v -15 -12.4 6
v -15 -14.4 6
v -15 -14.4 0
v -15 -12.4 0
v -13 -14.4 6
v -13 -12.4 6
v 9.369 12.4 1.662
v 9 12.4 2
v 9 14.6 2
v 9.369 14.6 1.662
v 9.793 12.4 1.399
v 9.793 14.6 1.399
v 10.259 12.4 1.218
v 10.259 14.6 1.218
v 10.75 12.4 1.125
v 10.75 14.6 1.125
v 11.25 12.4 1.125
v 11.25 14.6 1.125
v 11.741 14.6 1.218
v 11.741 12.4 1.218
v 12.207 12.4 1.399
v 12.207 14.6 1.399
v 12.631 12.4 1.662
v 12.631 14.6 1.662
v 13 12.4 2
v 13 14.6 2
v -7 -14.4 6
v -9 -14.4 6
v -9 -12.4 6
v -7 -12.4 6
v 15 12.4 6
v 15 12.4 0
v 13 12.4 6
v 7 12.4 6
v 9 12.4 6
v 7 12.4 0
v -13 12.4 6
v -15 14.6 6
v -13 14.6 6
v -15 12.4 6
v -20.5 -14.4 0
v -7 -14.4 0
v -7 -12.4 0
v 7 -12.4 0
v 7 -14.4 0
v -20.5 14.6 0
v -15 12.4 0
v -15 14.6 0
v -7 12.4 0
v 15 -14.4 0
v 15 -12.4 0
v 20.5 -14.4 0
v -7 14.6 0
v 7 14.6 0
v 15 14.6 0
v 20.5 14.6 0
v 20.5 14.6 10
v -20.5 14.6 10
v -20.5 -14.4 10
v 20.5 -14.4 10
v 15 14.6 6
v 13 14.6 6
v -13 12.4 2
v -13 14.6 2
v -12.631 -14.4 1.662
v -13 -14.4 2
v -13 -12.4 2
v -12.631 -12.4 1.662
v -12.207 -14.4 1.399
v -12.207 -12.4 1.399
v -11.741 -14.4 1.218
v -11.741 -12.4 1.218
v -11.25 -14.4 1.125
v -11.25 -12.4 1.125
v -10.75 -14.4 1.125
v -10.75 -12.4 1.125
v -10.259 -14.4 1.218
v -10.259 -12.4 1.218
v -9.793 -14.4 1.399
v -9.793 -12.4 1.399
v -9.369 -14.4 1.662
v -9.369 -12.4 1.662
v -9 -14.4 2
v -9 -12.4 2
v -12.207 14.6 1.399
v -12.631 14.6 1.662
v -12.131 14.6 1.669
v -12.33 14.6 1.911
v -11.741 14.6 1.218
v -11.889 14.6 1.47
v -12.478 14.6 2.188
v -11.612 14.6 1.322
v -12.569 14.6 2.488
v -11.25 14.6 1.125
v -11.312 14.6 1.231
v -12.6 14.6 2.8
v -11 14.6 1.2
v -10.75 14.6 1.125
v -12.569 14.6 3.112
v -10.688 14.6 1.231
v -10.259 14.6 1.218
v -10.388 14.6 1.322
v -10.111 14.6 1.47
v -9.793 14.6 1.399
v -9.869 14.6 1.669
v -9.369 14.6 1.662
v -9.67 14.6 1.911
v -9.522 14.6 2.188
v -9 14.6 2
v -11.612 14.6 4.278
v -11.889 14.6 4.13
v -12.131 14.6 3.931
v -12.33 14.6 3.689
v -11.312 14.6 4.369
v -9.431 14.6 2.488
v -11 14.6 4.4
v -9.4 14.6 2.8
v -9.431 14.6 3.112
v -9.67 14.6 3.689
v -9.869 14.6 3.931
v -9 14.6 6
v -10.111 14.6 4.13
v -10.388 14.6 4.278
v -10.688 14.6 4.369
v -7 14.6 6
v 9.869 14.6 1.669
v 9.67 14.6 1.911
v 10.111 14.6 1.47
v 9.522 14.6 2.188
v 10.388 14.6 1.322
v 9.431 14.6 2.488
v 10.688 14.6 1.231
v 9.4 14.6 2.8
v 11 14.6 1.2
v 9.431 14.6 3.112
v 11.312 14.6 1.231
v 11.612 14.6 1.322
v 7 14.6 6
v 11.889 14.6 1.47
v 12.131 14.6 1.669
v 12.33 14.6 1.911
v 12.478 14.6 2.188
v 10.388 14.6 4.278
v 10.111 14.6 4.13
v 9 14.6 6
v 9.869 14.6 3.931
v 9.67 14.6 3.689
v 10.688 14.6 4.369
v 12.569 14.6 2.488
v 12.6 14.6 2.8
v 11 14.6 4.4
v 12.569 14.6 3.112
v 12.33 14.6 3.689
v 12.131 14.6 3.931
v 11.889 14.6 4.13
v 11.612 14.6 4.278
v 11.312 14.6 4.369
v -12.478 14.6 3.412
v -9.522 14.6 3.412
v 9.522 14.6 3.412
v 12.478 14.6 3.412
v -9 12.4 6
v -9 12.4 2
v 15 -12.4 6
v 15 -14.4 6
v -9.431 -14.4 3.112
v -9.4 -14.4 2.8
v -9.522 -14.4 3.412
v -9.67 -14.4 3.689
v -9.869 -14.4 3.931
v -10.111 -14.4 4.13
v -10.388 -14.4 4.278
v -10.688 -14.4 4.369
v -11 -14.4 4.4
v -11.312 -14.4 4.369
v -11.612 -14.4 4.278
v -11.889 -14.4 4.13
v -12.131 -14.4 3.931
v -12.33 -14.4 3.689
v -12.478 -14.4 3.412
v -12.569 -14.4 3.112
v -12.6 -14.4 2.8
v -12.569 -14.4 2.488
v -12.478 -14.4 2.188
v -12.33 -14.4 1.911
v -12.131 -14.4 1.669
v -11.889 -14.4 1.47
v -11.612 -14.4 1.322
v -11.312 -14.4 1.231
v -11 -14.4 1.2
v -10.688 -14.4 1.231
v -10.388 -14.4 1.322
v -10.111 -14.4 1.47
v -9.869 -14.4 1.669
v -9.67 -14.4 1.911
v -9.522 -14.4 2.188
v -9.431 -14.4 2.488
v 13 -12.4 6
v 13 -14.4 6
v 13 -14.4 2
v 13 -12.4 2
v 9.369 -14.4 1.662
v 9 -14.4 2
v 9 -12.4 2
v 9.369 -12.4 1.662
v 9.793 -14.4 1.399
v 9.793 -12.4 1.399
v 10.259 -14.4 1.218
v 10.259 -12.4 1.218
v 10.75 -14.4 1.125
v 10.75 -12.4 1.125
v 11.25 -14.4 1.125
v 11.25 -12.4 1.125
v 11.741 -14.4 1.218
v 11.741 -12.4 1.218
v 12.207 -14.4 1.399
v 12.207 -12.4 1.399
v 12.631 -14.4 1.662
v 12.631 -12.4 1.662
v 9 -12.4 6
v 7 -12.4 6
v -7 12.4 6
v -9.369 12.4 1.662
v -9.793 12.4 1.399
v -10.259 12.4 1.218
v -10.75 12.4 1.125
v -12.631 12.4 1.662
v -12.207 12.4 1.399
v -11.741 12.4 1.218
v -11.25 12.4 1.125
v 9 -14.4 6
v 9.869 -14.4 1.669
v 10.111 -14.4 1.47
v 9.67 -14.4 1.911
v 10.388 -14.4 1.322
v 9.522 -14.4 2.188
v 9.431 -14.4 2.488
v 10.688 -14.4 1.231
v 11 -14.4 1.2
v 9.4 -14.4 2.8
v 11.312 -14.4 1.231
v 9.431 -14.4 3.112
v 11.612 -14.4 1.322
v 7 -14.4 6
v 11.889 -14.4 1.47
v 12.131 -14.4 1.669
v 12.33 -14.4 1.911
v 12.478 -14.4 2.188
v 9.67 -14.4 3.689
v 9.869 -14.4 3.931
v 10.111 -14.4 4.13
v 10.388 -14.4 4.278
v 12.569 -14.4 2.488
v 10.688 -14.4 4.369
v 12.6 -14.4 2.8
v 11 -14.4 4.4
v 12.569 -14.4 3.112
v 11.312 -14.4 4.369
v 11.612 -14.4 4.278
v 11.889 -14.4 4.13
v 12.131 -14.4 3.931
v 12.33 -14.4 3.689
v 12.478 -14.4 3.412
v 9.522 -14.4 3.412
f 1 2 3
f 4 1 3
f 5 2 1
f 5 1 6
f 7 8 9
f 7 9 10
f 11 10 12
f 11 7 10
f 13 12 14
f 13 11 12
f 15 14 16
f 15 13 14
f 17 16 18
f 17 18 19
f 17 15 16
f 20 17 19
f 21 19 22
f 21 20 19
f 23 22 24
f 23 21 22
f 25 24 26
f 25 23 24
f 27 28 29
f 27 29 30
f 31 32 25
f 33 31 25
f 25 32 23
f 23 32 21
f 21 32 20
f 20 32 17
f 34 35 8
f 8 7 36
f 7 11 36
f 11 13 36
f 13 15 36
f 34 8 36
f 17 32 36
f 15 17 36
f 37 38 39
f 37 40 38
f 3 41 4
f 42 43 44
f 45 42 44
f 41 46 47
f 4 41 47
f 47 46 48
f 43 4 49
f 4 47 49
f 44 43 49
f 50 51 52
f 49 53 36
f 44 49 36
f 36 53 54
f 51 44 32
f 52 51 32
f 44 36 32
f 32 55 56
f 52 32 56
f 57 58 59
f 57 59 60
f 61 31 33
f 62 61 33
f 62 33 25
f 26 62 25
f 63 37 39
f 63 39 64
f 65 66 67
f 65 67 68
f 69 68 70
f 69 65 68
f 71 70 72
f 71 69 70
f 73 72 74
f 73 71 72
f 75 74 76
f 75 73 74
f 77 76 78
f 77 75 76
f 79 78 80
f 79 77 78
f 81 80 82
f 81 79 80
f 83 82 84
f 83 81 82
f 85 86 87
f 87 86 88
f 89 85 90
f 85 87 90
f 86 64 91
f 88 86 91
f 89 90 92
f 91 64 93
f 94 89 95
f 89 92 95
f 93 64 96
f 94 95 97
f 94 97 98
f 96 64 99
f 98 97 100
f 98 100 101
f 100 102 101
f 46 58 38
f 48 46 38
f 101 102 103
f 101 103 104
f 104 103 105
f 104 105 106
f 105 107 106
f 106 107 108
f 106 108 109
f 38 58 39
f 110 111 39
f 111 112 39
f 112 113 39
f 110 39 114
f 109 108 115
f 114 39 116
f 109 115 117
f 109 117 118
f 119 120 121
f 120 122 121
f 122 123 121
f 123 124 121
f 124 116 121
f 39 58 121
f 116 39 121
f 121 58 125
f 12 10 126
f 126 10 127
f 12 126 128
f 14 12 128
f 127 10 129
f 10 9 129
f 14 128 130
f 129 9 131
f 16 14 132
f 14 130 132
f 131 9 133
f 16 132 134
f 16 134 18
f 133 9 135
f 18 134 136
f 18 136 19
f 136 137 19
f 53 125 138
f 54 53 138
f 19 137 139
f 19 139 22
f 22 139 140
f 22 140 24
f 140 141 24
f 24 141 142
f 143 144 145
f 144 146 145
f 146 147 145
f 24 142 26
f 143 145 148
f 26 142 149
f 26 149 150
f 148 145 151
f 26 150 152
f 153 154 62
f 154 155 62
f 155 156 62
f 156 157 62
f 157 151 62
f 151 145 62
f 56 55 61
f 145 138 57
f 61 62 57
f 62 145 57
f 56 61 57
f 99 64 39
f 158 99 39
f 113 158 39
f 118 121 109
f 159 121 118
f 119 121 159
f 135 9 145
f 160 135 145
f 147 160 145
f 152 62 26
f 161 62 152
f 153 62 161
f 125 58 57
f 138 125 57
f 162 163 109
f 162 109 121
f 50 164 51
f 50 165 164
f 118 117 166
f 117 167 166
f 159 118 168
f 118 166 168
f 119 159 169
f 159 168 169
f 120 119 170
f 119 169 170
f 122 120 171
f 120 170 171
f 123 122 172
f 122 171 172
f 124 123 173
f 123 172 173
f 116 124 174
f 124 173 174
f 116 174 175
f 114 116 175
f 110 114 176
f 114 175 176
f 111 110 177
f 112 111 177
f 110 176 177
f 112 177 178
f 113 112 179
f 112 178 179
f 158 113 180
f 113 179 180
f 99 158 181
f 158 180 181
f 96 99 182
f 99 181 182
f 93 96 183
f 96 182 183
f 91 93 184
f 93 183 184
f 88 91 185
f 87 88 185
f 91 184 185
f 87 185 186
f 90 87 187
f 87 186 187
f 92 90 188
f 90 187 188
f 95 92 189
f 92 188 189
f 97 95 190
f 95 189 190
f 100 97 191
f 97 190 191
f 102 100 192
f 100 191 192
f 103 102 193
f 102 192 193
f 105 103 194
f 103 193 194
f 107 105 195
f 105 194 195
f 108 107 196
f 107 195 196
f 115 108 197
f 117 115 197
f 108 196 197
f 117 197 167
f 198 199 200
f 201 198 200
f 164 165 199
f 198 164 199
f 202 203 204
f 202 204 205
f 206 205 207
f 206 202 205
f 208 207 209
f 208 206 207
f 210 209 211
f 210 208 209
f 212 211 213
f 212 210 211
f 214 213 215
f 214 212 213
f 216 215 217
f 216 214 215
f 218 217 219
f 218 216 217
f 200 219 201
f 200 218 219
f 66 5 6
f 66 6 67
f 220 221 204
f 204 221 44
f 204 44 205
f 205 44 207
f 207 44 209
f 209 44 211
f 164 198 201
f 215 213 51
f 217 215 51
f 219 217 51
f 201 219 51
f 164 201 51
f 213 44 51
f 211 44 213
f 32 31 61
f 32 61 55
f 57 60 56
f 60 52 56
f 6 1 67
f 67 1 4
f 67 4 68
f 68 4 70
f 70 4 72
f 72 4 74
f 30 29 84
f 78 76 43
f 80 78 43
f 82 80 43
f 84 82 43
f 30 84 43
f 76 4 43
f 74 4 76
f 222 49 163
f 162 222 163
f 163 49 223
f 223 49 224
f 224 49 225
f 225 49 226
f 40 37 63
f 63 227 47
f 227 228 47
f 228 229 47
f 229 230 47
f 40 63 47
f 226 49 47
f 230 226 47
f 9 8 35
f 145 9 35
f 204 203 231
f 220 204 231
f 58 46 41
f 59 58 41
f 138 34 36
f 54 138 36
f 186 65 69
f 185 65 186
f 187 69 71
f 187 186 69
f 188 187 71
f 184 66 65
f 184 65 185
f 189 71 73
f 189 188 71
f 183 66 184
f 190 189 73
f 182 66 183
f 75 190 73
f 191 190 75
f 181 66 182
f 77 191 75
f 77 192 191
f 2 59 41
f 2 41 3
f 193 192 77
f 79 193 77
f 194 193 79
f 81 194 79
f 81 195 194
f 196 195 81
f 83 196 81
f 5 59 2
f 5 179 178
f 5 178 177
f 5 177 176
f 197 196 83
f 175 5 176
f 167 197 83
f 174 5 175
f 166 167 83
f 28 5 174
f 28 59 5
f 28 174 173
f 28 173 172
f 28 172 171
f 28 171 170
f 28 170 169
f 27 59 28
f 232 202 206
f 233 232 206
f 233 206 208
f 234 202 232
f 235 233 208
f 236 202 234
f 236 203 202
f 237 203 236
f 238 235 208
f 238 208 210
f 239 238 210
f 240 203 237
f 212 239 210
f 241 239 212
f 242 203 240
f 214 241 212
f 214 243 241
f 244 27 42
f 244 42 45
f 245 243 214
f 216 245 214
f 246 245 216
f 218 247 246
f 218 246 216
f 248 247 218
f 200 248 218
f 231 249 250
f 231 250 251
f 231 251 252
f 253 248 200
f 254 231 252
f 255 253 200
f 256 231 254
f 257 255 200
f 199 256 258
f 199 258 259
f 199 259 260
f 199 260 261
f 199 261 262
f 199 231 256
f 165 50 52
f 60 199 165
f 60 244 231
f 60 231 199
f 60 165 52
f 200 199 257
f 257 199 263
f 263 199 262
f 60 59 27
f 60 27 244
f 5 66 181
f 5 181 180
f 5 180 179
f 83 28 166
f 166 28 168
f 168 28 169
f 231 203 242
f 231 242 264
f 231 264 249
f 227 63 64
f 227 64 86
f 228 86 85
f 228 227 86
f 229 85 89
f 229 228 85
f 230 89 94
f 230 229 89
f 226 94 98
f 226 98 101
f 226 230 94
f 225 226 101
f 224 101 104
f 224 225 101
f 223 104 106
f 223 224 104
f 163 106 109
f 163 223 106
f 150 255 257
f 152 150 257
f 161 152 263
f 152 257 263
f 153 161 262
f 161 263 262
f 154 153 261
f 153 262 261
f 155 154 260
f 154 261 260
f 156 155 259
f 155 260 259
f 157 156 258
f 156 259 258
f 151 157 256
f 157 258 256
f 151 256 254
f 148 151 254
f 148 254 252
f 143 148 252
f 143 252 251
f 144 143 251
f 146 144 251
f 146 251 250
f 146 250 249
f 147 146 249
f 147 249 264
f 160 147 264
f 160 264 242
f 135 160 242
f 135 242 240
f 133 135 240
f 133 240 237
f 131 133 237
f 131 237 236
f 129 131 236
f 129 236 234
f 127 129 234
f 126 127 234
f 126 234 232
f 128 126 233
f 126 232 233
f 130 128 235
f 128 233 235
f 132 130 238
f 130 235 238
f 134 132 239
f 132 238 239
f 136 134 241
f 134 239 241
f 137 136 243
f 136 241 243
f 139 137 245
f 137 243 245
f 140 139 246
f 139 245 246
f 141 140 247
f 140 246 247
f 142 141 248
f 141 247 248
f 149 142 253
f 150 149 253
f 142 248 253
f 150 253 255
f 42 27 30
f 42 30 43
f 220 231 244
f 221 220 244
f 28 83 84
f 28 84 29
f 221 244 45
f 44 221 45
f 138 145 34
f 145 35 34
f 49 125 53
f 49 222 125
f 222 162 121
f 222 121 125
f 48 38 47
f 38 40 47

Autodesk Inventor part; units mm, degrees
ref_plane "YZ Plane" through (0, 0, 0) normal (1, 0, 0) x (0, 1, 0)
ref_plane "XZ Plane" through (0, 0, 0) normal (0, 1, 0) x (-1, 0, 0)
ref_plane "XY Plane" through (0, 0, 0) normal (0, 0, 1) x (1, 0, 0)
sketch "Szkic1" plane through (0, 0, 0) normal (0, 0, 1) x (1, 0, 0)
  line L0 (-28.7, 0) -> (28.7, 0) construction
  line L1 (0, -17.36) -> (0, 17.36) construction
  line L2 (-20.5, -12.4) -> (20.5, -12.4)
  line L3 (20.5, -12.4) -> (20.5, 12.4)
  line L4 (20.5, 12.4) -> (-20.5, 12.4)
  line L5 (-20.5, 12.4) -> (-20.5, -12.4)
  line L6 (-20.5, -12.4) -> (20.5, 12.4) construction
  line L7 (20.5, -12.4) -> (-20.5, 12.4) construction
  point P0 (0, 0)
  dimension "d0" = 41
  dimension "d1" = 24.8
extrude "Wyciągnięcie proste1" add sketch "Szkic1" along normal blind 10
sketch "Szkic2" plane through (-20.5, -12.4, 0) normal (0, -1, 0) x (1, 0, 0)
  point P0 (20.5, 0)
sketch "Szkic3" plane through (-20.5, -12.4, 0) normal (0, -1, 0) x (1, 0, 0)
  line L0 (-8.2, 0) -> (49.2, 0) construction
  line L1 (20.5, -2) -> (20.5, 12) construction
  line L2 (5.5, 6) -> (5.5, 0)
  line L3 (0, 0) -> (41, 0) projected
  line L4 (5.5, 6) -> (7.5, 6)
  line L5 (7.5, 6) -> (7.5, 2)
  line L6 (7.5, 2) -> (11.5, 2) construction
  line L7 (11.5, 2) -> (11.5, 6)
  line L8 (11.5, 6) -> (13.5, 6)
  line L9 (13.5, 6) -> (13.5, 0)
  line L10 (5.5, 0) -> (13.5, 0)
  line L11 (0, 0) -> (0, 10) projected
  line L12 (0, 0) -> (41, 0)
  line L13 (41, 0) -> (41, 10)
  line L14 (41, 10) -> (0, 10)
  line L15 (0, 10) -> (0, 0)
  arc A0 (7.5, 2) -> (11.5, 2) centre (9.5, 3.8138) ccw
  line L16 (35.5, 6) -> (35.5, 0)
  line L17 (35.5, 6) -> (33.5, 6)
  line L18 (33.5, 6) -> (33.5, 2)
  line L19 (29.5, 2) -> (29.5, 6)
  line L20 (29.5, 6) -> (27.5, 6)
  line L21 (27.5, 6) -> (27.5, 0)
  arc A1 (29.5, 2) -> (33.5, 2) centre (31.5, 3.8138) ccw
  circle A2 centre (31.5, 2.8) radius 1.6
  circle A3 centre (9.5, 2.8) radius 1.6
  point P0 (20.5, 0)
  point P1 (20.5, 0)
  dimension "d4" = 6
  dimension "d5" = 15
  dimension "d6" = 2
  dimension "d7" = 4
  dimension "d8" = 4
  dimension "d9" = 4
  dimension "d10" = 2
  dimension "d11" = 20.5
  dimension "d12" = 10
  dimension "d13" = 2.7
  dimension "d16" = 3.2
  dimension "d17" = 2.8
  dimension "d18" = 11
extrude "Wyciągnięcie proste2" add sketch "Szkic3" along normal blind 2 and the other way blind 27 contours L2 L3 L11 L14 L13 L16 L17 L18 A1 L19 L20 L21 L9 L8 L7 A0 L5 L4 | A2 | A3
extrude "Wyciągnięcie proste3" cut sketch "Szkic3" along normal through all both and the other way through all contours A2 | A3
properties part number "uMule-uchwyt_dx"
